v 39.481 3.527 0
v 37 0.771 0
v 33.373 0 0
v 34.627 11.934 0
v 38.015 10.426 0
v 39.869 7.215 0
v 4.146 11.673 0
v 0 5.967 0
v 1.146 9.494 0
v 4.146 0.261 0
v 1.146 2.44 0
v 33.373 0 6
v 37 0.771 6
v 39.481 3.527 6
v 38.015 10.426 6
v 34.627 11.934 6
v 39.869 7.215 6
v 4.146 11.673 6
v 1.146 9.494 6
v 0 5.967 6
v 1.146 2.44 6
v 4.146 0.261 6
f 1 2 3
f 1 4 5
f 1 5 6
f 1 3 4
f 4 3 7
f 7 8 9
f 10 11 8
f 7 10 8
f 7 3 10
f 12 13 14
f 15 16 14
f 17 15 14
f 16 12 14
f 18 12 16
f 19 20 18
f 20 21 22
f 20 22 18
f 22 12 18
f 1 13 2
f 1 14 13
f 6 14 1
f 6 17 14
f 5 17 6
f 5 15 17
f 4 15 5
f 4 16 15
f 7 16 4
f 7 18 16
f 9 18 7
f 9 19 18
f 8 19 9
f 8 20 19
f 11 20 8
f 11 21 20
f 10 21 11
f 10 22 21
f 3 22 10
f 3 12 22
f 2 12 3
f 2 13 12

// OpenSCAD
$fn = 32;

// ----------------------------------------------------------------------
// Key bar: parallel key, 6 mm thick
// ----------------------------------------------------------------------

// --- parameters (mm) ---
profile_height = 6;       // extrusion height
profile_points = 11;      // points of the closed outline

profile = [[0, 5.967], [1.146, 2.44], [4.146, 0.261], [33.373, 0], [37, 0.771], [39.481, 3.527], [39.869, 7.215], [38.015, 10.426], [34.627, 11.934], [4.146, 11.673], [1.146, 9.494]];  // single closed polygon, 11 points, counter clockwise

// --- the one profile operation ---
linear_extrude(height = profile_height) polygon(points = profile);
